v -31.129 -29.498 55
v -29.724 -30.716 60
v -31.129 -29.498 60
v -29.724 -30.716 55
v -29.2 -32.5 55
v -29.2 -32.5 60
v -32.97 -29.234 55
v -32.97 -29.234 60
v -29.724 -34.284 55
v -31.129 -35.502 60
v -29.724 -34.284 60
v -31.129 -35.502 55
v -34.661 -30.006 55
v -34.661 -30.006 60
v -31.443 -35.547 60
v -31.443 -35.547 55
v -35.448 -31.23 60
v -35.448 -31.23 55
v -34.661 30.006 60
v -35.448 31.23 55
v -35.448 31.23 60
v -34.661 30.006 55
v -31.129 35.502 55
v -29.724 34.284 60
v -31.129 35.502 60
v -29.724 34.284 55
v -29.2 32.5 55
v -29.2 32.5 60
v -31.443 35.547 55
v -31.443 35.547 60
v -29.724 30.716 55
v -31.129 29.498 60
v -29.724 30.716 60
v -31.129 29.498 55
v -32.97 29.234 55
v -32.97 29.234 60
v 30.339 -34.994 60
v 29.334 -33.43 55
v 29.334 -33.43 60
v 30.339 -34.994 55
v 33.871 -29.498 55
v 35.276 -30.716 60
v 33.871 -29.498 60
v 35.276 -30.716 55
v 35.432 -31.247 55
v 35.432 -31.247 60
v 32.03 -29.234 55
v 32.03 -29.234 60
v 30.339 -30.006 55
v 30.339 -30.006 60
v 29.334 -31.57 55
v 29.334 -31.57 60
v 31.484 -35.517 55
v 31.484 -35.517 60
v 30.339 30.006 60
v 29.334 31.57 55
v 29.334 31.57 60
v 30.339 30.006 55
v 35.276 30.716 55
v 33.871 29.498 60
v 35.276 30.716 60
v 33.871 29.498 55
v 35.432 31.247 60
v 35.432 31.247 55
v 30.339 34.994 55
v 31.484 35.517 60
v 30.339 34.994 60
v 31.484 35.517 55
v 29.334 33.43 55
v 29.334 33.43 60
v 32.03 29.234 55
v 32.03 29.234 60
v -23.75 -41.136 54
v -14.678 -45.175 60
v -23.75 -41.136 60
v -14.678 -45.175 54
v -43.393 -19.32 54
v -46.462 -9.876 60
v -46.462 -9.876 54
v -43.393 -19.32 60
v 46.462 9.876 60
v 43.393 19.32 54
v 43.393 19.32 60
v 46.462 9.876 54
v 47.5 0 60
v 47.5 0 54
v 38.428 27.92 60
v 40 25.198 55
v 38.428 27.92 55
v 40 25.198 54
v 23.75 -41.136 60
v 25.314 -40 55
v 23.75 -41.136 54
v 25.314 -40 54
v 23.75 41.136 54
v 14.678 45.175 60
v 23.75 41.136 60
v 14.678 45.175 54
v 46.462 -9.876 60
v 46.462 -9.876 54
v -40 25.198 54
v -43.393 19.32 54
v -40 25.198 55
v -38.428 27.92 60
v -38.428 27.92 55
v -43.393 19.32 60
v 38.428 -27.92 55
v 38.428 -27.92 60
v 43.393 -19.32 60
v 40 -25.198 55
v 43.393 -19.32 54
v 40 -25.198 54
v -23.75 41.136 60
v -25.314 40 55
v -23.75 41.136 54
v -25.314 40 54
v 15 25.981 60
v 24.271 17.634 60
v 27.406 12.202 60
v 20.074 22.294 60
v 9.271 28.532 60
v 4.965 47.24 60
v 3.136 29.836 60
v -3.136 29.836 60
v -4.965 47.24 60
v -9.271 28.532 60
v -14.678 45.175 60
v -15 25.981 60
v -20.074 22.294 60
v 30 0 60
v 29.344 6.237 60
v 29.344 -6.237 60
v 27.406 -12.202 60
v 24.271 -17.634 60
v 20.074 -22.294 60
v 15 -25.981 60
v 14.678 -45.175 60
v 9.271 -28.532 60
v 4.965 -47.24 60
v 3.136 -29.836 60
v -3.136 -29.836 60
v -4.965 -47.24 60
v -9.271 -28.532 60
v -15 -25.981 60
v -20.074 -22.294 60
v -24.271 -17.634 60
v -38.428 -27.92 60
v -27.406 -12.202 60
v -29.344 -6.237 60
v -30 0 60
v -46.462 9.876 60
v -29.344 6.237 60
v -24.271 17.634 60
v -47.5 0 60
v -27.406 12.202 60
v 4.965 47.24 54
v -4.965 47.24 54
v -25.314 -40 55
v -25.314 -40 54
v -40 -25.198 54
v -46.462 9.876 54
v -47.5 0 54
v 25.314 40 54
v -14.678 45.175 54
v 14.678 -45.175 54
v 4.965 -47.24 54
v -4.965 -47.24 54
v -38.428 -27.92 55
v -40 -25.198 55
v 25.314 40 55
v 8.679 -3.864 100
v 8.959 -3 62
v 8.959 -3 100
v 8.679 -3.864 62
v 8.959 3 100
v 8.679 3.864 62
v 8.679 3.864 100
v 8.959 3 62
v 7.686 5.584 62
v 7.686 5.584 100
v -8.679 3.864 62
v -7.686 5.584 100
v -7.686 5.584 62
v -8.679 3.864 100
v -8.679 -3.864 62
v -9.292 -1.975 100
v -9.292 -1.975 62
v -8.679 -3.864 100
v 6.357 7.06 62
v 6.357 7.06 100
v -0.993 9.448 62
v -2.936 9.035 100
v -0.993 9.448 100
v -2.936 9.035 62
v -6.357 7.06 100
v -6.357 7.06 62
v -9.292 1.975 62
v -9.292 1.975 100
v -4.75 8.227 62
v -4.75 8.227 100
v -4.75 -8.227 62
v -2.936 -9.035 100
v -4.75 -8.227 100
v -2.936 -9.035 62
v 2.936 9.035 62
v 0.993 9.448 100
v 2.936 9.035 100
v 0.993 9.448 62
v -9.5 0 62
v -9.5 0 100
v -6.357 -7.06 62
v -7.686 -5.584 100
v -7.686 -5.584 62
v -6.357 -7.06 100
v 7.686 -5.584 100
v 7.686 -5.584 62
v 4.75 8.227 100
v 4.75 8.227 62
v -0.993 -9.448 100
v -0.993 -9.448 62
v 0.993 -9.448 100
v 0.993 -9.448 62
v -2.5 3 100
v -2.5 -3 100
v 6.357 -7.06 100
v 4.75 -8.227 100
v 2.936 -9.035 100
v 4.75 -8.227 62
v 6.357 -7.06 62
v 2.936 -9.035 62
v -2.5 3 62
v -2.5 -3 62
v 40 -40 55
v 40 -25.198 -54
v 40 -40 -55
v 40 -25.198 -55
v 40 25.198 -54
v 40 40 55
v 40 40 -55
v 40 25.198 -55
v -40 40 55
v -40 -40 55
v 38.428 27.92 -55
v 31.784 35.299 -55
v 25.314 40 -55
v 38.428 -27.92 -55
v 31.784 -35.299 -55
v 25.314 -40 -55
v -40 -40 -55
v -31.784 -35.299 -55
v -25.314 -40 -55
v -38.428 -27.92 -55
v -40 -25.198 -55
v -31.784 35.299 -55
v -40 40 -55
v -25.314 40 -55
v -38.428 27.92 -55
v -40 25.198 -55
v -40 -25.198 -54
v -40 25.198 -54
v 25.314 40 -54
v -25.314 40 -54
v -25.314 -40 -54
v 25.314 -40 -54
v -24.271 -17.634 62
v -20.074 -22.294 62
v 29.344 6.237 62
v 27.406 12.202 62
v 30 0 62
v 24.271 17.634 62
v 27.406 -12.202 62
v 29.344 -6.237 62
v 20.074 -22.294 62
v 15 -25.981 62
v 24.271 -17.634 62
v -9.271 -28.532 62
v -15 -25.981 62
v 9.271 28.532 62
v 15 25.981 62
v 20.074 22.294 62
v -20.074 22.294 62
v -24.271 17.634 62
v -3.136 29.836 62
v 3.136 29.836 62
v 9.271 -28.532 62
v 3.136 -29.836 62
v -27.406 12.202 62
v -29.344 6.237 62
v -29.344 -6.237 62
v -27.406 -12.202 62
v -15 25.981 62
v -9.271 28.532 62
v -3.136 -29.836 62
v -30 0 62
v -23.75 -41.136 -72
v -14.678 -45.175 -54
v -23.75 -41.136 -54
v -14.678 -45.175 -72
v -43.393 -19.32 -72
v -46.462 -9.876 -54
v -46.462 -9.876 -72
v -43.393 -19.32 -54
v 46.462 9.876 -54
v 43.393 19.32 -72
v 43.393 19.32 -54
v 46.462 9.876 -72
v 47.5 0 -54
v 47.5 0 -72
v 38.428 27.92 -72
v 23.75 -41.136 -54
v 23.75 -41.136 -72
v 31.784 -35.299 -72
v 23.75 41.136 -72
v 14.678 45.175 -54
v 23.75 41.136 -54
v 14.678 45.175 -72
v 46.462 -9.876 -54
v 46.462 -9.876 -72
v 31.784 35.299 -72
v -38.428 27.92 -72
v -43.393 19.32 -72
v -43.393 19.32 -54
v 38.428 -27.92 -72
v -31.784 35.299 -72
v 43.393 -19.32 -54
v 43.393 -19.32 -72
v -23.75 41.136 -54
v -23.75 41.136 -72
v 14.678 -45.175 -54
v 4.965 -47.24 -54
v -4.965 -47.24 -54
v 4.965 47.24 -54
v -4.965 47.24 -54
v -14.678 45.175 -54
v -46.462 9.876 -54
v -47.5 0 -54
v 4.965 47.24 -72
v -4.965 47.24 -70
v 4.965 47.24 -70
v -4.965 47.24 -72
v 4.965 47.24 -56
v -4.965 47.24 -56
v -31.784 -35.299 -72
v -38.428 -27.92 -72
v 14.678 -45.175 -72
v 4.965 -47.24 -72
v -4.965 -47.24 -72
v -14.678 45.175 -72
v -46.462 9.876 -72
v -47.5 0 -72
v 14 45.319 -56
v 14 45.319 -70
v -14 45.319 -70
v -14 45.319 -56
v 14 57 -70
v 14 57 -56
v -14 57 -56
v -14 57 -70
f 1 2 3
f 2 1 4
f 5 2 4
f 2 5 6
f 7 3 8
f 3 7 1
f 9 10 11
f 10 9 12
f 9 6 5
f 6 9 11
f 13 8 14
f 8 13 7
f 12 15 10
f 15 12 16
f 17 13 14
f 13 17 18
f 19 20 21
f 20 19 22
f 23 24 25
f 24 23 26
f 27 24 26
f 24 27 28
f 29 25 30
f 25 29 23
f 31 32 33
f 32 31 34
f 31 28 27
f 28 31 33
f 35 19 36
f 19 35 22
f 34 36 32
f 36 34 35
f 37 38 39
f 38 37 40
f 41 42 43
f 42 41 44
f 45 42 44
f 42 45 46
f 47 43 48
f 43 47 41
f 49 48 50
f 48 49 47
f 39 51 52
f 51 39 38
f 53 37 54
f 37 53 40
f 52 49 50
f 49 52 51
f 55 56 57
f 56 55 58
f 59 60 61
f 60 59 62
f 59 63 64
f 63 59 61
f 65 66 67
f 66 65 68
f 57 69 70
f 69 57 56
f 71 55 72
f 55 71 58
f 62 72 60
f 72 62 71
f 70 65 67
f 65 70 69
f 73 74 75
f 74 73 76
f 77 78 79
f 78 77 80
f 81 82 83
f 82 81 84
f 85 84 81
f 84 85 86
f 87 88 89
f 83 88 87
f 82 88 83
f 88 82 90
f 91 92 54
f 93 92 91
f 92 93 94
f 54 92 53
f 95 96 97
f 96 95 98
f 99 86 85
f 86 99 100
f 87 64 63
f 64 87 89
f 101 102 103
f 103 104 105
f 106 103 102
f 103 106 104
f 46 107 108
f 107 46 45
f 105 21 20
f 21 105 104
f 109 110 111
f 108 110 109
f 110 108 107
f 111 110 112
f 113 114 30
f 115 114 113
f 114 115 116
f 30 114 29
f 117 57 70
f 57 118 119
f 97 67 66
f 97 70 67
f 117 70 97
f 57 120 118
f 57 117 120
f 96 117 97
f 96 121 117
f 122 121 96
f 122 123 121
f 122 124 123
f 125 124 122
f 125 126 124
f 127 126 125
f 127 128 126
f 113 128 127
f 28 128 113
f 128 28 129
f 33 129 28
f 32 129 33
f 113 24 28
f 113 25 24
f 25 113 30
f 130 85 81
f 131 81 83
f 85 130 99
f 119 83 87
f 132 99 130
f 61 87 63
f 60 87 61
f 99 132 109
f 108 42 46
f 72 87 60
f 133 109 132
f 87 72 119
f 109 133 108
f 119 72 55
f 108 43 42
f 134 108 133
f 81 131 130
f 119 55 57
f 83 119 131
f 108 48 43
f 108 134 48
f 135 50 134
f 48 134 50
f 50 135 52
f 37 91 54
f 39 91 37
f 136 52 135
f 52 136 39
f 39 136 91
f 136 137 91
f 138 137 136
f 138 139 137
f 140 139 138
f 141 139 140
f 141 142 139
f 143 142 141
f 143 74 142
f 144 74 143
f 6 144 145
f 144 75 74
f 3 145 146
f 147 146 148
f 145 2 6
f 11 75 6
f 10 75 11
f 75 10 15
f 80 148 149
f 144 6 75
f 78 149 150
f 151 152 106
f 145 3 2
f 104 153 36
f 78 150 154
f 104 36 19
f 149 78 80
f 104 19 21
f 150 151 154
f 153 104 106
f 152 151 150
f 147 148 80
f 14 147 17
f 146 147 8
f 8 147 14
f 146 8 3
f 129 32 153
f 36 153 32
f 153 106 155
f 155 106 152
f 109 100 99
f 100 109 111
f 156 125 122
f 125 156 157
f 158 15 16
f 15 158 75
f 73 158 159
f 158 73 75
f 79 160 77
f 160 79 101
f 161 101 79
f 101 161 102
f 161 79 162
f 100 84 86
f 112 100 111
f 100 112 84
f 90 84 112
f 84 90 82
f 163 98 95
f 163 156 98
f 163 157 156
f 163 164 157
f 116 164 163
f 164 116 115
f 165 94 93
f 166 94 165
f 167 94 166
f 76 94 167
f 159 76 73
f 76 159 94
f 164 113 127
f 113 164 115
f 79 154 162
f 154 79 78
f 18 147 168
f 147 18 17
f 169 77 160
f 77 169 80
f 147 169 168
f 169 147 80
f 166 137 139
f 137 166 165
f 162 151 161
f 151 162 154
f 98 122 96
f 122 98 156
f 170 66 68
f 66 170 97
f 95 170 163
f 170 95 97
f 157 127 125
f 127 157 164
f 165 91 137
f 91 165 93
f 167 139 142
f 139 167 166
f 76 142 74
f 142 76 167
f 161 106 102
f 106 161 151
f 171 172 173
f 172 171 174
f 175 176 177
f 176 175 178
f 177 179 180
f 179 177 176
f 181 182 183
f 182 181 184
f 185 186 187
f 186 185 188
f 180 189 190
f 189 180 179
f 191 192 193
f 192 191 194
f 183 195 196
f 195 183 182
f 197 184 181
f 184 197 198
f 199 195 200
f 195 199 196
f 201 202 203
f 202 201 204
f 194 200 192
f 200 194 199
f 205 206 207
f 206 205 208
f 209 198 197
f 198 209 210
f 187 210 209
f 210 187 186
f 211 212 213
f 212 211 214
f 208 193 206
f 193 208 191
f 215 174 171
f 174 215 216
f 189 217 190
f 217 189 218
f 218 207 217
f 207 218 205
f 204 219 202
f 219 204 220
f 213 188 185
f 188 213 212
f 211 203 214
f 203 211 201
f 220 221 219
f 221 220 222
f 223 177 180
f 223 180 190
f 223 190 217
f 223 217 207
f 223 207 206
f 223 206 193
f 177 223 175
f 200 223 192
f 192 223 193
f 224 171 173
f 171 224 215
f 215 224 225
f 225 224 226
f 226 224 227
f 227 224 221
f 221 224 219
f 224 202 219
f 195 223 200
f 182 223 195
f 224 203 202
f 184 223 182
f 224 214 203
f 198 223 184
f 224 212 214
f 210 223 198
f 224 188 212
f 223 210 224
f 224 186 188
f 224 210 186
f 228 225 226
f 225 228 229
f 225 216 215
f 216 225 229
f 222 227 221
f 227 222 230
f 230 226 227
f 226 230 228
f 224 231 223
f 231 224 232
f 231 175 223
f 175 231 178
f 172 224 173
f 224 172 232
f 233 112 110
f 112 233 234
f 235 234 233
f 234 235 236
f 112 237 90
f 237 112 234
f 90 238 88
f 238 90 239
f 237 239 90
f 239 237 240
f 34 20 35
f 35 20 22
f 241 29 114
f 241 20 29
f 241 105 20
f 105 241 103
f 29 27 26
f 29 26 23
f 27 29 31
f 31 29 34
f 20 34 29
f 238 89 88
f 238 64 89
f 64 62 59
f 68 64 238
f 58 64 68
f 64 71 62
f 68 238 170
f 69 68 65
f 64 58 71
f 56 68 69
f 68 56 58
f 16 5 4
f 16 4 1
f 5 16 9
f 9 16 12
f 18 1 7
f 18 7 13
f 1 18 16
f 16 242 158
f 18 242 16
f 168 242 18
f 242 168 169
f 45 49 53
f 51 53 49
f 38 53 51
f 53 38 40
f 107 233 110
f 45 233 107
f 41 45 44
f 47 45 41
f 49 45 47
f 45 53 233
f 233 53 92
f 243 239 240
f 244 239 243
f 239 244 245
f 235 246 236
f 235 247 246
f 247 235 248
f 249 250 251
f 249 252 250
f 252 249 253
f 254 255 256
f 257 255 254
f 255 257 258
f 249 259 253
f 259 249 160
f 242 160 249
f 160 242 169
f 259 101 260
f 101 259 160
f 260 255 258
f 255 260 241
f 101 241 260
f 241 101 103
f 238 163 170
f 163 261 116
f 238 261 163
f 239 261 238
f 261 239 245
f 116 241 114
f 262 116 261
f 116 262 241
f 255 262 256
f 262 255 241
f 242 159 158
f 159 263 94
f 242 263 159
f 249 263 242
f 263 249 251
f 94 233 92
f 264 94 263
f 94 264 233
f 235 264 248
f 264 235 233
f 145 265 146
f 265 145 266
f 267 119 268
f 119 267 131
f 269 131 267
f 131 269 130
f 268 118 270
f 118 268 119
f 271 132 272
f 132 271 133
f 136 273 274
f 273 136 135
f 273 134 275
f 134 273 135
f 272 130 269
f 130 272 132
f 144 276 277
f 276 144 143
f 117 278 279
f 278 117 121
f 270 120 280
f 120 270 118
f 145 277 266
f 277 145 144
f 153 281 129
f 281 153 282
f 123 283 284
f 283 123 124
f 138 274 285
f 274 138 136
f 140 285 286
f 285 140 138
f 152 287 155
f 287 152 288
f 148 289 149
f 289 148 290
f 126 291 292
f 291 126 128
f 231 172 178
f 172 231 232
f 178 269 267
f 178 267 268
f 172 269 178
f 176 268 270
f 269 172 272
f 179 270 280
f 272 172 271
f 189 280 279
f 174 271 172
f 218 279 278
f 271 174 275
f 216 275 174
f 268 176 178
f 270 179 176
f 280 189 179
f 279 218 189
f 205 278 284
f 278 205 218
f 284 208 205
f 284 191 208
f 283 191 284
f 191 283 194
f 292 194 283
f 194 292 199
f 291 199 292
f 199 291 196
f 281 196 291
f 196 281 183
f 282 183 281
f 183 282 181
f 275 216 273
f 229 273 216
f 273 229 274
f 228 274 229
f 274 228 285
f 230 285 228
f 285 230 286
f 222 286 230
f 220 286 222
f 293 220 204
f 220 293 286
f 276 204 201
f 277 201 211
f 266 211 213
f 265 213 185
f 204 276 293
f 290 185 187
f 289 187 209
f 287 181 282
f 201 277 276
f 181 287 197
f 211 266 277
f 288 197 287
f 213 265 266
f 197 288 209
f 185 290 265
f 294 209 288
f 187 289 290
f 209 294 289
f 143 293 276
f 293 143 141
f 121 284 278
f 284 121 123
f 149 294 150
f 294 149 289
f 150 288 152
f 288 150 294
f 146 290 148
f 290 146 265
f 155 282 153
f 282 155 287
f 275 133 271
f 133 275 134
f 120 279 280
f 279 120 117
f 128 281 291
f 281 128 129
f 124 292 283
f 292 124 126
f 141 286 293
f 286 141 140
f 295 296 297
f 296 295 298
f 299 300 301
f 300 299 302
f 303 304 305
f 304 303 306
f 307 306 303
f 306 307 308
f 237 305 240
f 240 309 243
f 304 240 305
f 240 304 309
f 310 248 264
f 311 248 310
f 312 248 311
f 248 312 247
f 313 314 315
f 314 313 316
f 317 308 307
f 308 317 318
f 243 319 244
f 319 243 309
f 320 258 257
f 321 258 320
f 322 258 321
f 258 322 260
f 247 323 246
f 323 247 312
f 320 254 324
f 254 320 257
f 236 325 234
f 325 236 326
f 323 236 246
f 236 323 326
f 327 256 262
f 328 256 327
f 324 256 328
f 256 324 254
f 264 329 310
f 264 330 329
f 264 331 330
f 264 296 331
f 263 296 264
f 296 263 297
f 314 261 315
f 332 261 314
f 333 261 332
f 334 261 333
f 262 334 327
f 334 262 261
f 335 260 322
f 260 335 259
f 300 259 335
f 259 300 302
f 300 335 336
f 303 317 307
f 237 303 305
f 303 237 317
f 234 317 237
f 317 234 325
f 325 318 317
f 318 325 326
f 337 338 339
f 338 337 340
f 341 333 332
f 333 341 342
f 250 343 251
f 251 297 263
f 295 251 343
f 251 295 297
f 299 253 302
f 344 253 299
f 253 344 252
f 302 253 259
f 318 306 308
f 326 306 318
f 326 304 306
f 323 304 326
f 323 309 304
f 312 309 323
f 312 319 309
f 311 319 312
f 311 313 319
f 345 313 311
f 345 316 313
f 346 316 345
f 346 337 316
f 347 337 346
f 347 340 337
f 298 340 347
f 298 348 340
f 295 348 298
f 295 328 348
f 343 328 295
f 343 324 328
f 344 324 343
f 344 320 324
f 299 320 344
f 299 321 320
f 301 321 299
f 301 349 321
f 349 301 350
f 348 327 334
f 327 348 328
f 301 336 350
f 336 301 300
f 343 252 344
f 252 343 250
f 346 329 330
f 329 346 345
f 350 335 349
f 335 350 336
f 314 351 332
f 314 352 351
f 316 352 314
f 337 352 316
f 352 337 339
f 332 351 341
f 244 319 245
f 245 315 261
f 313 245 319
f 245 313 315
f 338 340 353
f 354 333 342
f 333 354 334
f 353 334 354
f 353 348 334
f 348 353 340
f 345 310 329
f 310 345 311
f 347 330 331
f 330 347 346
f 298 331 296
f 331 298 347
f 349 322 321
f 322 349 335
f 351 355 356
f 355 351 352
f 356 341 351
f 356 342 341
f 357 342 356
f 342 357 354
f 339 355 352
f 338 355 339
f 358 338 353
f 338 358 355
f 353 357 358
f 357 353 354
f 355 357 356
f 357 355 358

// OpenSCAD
// Parameters
motor_frame_size_mm = 80; //[40:160:1]
body_length_mm = 110; //[60:220:1]
body_width_mm = 80; //[40:160:1]
body_height_mm = 80; //[40:160:1]
flange_outer_diameter_mm = 95; //[60:190:1]
flange_thickness_mm = 6; //[3:12:1]
pilot_diameter_mm = 60; //[30:120:1]
pilot_depth_mm = 2; //[1:6:1]
mount_hole_count = 4; //[4:4:1]
mount_hole_diameter_mm = 6.6; //[3:12:0.1]
mount_hole_pitch_mm = 65; //[40:120:1]
shaft_diameter_mm = 19; //[8:38:0.5]
shaft_length_mm = 40; //[15:80:1]
shaft_key_width_mm = 6; //[3:12:0.5]
shaft_key_depth_mm = 1.5; //[0.5:4:0.1]
rear_cap_length_mm = 18; //[8:40:1]
connector_width_mm = 28; //[14:56:1]
connector_height_mm = 18; //[9:36:1]
connector_depth_mm = 14; //[7:28:1]
overlap_mm = 1; //[0.5:2:0.5]
hole_depth_extra_mm = 2; //[1:6:1]

// Servo Motor - complete geometry
module servo_motor() {
  color([0.15, 0.2, 0.35]) {
    // Body
    translate([0, 0, 0])
      cube([body_width_mm, body_height_mm, body_length_mm], center=true);

    // Front Faceplate Flange
    translate([0, 0, body_length_mm/2 + flange_thickness_mm/2 - overlap_mm])
      difference() {
        cylinder(r=flange_outer_diameter_mm/2, h=flange_thickness_mm, center=true);
        // Mounting holes
        for (x = [-mount_hole_pitch_mm/2, mount_hole_pitch_mm/2])
          for (y = [-mount_hole_pitch_mm/2, mount_hole_pitch_mm/2])
            translate([x, y, 0])
              cylinder(r=mount_hole_diameter_mm/2, h=flange_thickness_mm + pilot_depth_mm + hole_depth_extra_mm, center=true);
      }

    // Pilot Boss
    translate([0, 0, body_length_mm/2 + flange_thickness_mm - overlap_mm + pilot_depth_mm/2])
      cylinder(r=pilot_diameter_mm/2, h=pilot_depth_mm, center=true);

    // Output Shaft
    translate([0, 0, body_length_mm/2 + flange_thickness_mm - overlap_mm + shaft_length_mm/2])
      difference() {
        cylinder(r=shaft_diameter_mm/2, h=shaft_length_mm, center=true);
        // Shaft Key
        translate([shaft_diameter_mm/2 - shaft_key_depth_mm, 0, 0])
          cube([shaft_diameter_mm + 2*overlap_mm, shaft_key_width_mm, shaft_length_mm + 2*overlap_mm], center=true);
      }

    // Rear Endcap
    translate([0, 0, -body_length_mm/2 - rear_cap_length_mm/2 + overlap_mm])
      cylinder(r=flange_outer_diameter_mm/2, h=rear_cap_length_mm, center=true);

    // Cable Connector Boss
    translate([0, body_height_mm/2 + connector_height_mm/2 - overlap_mm, -body_length_mm/2 - rear_cap_length_mm/2 + overlap_mm])
      cube([connector_width_mm, connector_height_mm, connector_depth_mm], center=true);
  }
}

// Assembly
module assembly() {
  servo_motor();
}

assembly();
